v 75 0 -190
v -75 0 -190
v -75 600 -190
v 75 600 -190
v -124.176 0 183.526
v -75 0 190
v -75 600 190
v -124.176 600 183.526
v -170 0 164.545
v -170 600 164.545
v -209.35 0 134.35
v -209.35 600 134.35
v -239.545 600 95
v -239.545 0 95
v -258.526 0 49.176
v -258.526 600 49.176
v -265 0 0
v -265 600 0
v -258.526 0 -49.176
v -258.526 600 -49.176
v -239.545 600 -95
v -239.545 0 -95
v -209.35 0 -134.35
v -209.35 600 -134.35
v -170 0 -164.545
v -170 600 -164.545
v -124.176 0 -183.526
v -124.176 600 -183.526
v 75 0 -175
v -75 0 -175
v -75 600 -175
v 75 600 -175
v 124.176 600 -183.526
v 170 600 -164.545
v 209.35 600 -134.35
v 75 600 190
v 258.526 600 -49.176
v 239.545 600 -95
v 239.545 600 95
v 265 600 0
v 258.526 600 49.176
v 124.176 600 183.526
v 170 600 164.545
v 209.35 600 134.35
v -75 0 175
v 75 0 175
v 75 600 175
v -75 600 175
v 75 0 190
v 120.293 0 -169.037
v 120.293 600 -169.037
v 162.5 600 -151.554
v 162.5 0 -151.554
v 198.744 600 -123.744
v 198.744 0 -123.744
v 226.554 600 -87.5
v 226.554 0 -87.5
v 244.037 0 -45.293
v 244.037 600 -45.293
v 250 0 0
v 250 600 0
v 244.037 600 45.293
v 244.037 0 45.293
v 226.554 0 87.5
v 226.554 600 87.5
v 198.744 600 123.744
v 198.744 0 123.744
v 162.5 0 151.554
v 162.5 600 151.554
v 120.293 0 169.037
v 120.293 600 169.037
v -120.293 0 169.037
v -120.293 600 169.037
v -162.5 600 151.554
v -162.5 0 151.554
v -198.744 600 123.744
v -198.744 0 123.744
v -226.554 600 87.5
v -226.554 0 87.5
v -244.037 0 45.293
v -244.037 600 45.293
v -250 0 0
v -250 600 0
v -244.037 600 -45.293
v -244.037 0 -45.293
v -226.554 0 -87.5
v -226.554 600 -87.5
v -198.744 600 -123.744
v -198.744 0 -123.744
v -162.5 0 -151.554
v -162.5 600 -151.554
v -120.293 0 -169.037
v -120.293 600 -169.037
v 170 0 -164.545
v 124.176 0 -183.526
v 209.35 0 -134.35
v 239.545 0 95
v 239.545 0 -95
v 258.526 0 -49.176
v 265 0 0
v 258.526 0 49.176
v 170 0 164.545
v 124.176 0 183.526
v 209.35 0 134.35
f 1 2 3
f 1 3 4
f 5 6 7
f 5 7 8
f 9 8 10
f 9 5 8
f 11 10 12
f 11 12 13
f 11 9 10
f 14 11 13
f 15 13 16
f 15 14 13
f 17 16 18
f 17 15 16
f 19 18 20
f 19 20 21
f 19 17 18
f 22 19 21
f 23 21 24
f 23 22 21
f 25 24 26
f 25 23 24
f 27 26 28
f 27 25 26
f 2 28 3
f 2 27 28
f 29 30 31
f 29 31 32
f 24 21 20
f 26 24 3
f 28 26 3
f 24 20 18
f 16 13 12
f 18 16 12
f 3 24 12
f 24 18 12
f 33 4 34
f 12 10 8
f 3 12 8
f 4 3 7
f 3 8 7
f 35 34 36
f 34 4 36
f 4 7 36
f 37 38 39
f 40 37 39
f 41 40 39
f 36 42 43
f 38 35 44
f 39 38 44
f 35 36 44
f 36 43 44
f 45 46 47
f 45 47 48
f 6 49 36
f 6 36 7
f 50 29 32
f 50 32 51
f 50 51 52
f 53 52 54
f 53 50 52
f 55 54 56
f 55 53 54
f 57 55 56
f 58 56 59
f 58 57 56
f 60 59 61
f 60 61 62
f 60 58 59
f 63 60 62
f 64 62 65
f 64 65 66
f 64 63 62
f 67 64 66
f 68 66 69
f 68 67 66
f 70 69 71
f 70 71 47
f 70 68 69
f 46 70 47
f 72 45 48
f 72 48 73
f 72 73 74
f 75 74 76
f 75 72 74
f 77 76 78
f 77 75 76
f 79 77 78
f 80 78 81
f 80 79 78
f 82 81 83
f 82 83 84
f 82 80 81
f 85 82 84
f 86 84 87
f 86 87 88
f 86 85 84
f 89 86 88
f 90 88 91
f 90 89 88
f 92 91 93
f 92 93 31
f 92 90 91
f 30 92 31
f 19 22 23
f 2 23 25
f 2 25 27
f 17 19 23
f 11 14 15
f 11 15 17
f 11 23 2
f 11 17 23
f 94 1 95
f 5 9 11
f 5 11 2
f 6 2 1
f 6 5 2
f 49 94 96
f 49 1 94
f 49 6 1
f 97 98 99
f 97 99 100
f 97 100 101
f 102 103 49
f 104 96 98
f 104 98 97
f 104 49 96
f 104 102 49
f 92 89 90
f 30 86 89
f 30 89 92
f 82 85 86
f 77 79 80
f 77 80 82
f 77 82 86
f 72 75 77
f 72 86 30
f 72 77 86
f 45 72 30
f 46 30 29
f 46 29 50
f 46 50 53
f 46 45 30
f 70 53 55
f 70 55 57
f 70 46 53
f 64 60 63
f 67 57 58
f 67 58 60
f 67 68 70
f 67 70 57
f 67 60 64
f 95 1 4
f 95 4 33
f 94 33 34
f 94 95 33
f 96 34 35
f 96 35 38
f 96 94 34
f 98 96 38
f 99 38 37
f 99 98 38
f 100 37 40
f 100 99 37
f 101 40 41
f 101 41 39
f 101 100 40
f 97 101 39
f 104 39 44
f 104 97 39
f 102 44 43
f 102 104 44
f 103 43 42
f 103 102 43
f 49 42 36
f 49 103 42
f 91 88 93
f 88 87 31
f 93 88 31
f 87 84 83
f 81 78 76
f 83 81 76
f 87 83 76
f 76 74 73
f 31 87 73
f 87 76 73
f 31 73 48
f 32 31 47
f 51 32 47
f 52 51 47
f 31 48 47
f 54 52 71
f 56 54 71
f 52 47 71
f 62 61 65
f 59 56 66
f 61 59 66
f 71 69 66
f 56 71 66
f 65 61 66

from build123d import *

# Parameters (mm, degrees)
F2_DEPTH = 600


with BuildPart() as f2:
    # F1 (on face) → F2 (new body)
    with BuildSketch(Plane.XZ):
        with BuildLine():
            Line((75, 190), (-75, 190))
            ThreePointArc((-75, 190), (-265, 0), (-75, -190))
            Line((-75, -190), (75, -190))
            ThreePointArc((75, -190), (265, 0), (75, 190))
        make_face()
        with BuildLine():
            ThreePointArc((-75, -175), (-250, 0), (-75, 175))
            Line((-75, 175), (75, 175))
            ThreePointArc((75, 175), (250, 0), (75, -175))
            Line((75, -175), (-75, -175))
        make_face(mode=Mode.SUBTRACT)
        with BuildLine():
            Line((75, 175), (-75, 175))
            ThreePointArc((-75, 175), (-250, 0), (-75, -175))
            Line((-75, -175), (75, -175))
            ThreePointArc((75, -175), (250, 0), (75, 175))
        make_face()
    extrude(amount=-F2_DEPTH)


with BuildPart() as f2b:
    # F0 (on Front) → F2, piece 2 (new body)
    with BuildSketch(Plane.XZ):
        with BuildLine():
            ThreePointArc((-75, 175), (-250, 0), (-75, -175))
            Line((-75, -175), (75, -175))
            ThreePointArc((75, -175), (250, 0), (75, 175))
            Line((75, 175), (-75, 175))
        make_face()
    extrude(amount=-F2_DEPTH)


solid = Compound([f2.part, f2b.part])
